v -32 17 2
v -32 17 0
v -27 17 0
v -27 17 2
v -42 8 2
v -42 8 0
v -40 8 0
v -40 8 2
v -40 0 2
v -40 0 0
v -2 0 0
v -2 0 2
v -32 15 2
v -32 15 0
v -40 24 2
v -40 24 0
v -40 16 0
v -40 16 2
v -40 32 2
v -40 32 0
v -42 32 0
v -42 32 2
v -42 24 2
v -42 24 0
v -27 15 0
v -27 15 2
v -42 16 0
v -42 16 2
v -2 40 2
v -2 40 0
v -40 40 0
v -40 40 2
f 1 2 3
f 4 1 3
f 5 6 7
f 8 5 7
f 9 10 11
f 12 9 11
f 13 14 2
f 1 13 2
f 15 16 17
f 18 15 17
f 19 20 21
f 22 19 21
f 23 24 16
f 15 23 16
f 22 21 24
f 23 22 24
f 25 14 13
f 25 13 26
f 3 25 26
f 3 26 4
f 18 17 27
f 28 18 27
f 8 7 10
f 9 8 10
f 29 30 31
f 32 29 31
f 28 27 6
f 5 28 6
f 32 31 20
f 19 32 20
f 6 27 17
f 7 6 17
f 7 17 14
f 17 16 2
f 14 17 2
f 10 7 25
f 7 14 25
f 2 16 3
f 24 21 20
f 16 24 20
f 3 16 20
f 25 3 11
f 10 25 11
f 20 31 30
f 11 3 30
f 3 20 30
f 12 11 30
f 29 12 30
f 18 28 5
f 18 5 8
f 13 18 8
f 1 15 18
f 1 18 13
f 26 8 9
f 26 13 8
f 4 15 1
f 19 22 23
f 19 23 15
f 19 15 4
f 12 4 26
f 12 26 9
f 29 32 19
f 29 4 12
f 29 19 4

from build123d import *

# Parameters (mm, degrees)
F0_DEPTH = 2
F1_W     = 5
F1_H     = 2
F2_DEPTH = 25


# Not quite as in the source:
# - a feature names something its author has since deleted; it is built from what else it names


with BuildPart() as f0:
    # F3 (on Top) → F0 (new body)
    with BuildSketch(Plane.XY):
        Polygon((-40, 0), (-2, 0), (-2, 40), (-40, 40), (-40, 32), (-42, 32), (-42, 24), (-40, 24), (-40, 16), (-42, 16), (-42, 8), (-40, 8), align=None)
    extrude(amount=F0_DEPTH)

    # F1 (on Top) → F2 (cut)
    with BuildSketch(Plane.XY):
        with Locations((-29.5, 16)):
            Rectangle(F1_W, F1_H)
    extrude(amount=F2_DEPTH, mode=Mode.SUBTRACT)


solid = f0.part
